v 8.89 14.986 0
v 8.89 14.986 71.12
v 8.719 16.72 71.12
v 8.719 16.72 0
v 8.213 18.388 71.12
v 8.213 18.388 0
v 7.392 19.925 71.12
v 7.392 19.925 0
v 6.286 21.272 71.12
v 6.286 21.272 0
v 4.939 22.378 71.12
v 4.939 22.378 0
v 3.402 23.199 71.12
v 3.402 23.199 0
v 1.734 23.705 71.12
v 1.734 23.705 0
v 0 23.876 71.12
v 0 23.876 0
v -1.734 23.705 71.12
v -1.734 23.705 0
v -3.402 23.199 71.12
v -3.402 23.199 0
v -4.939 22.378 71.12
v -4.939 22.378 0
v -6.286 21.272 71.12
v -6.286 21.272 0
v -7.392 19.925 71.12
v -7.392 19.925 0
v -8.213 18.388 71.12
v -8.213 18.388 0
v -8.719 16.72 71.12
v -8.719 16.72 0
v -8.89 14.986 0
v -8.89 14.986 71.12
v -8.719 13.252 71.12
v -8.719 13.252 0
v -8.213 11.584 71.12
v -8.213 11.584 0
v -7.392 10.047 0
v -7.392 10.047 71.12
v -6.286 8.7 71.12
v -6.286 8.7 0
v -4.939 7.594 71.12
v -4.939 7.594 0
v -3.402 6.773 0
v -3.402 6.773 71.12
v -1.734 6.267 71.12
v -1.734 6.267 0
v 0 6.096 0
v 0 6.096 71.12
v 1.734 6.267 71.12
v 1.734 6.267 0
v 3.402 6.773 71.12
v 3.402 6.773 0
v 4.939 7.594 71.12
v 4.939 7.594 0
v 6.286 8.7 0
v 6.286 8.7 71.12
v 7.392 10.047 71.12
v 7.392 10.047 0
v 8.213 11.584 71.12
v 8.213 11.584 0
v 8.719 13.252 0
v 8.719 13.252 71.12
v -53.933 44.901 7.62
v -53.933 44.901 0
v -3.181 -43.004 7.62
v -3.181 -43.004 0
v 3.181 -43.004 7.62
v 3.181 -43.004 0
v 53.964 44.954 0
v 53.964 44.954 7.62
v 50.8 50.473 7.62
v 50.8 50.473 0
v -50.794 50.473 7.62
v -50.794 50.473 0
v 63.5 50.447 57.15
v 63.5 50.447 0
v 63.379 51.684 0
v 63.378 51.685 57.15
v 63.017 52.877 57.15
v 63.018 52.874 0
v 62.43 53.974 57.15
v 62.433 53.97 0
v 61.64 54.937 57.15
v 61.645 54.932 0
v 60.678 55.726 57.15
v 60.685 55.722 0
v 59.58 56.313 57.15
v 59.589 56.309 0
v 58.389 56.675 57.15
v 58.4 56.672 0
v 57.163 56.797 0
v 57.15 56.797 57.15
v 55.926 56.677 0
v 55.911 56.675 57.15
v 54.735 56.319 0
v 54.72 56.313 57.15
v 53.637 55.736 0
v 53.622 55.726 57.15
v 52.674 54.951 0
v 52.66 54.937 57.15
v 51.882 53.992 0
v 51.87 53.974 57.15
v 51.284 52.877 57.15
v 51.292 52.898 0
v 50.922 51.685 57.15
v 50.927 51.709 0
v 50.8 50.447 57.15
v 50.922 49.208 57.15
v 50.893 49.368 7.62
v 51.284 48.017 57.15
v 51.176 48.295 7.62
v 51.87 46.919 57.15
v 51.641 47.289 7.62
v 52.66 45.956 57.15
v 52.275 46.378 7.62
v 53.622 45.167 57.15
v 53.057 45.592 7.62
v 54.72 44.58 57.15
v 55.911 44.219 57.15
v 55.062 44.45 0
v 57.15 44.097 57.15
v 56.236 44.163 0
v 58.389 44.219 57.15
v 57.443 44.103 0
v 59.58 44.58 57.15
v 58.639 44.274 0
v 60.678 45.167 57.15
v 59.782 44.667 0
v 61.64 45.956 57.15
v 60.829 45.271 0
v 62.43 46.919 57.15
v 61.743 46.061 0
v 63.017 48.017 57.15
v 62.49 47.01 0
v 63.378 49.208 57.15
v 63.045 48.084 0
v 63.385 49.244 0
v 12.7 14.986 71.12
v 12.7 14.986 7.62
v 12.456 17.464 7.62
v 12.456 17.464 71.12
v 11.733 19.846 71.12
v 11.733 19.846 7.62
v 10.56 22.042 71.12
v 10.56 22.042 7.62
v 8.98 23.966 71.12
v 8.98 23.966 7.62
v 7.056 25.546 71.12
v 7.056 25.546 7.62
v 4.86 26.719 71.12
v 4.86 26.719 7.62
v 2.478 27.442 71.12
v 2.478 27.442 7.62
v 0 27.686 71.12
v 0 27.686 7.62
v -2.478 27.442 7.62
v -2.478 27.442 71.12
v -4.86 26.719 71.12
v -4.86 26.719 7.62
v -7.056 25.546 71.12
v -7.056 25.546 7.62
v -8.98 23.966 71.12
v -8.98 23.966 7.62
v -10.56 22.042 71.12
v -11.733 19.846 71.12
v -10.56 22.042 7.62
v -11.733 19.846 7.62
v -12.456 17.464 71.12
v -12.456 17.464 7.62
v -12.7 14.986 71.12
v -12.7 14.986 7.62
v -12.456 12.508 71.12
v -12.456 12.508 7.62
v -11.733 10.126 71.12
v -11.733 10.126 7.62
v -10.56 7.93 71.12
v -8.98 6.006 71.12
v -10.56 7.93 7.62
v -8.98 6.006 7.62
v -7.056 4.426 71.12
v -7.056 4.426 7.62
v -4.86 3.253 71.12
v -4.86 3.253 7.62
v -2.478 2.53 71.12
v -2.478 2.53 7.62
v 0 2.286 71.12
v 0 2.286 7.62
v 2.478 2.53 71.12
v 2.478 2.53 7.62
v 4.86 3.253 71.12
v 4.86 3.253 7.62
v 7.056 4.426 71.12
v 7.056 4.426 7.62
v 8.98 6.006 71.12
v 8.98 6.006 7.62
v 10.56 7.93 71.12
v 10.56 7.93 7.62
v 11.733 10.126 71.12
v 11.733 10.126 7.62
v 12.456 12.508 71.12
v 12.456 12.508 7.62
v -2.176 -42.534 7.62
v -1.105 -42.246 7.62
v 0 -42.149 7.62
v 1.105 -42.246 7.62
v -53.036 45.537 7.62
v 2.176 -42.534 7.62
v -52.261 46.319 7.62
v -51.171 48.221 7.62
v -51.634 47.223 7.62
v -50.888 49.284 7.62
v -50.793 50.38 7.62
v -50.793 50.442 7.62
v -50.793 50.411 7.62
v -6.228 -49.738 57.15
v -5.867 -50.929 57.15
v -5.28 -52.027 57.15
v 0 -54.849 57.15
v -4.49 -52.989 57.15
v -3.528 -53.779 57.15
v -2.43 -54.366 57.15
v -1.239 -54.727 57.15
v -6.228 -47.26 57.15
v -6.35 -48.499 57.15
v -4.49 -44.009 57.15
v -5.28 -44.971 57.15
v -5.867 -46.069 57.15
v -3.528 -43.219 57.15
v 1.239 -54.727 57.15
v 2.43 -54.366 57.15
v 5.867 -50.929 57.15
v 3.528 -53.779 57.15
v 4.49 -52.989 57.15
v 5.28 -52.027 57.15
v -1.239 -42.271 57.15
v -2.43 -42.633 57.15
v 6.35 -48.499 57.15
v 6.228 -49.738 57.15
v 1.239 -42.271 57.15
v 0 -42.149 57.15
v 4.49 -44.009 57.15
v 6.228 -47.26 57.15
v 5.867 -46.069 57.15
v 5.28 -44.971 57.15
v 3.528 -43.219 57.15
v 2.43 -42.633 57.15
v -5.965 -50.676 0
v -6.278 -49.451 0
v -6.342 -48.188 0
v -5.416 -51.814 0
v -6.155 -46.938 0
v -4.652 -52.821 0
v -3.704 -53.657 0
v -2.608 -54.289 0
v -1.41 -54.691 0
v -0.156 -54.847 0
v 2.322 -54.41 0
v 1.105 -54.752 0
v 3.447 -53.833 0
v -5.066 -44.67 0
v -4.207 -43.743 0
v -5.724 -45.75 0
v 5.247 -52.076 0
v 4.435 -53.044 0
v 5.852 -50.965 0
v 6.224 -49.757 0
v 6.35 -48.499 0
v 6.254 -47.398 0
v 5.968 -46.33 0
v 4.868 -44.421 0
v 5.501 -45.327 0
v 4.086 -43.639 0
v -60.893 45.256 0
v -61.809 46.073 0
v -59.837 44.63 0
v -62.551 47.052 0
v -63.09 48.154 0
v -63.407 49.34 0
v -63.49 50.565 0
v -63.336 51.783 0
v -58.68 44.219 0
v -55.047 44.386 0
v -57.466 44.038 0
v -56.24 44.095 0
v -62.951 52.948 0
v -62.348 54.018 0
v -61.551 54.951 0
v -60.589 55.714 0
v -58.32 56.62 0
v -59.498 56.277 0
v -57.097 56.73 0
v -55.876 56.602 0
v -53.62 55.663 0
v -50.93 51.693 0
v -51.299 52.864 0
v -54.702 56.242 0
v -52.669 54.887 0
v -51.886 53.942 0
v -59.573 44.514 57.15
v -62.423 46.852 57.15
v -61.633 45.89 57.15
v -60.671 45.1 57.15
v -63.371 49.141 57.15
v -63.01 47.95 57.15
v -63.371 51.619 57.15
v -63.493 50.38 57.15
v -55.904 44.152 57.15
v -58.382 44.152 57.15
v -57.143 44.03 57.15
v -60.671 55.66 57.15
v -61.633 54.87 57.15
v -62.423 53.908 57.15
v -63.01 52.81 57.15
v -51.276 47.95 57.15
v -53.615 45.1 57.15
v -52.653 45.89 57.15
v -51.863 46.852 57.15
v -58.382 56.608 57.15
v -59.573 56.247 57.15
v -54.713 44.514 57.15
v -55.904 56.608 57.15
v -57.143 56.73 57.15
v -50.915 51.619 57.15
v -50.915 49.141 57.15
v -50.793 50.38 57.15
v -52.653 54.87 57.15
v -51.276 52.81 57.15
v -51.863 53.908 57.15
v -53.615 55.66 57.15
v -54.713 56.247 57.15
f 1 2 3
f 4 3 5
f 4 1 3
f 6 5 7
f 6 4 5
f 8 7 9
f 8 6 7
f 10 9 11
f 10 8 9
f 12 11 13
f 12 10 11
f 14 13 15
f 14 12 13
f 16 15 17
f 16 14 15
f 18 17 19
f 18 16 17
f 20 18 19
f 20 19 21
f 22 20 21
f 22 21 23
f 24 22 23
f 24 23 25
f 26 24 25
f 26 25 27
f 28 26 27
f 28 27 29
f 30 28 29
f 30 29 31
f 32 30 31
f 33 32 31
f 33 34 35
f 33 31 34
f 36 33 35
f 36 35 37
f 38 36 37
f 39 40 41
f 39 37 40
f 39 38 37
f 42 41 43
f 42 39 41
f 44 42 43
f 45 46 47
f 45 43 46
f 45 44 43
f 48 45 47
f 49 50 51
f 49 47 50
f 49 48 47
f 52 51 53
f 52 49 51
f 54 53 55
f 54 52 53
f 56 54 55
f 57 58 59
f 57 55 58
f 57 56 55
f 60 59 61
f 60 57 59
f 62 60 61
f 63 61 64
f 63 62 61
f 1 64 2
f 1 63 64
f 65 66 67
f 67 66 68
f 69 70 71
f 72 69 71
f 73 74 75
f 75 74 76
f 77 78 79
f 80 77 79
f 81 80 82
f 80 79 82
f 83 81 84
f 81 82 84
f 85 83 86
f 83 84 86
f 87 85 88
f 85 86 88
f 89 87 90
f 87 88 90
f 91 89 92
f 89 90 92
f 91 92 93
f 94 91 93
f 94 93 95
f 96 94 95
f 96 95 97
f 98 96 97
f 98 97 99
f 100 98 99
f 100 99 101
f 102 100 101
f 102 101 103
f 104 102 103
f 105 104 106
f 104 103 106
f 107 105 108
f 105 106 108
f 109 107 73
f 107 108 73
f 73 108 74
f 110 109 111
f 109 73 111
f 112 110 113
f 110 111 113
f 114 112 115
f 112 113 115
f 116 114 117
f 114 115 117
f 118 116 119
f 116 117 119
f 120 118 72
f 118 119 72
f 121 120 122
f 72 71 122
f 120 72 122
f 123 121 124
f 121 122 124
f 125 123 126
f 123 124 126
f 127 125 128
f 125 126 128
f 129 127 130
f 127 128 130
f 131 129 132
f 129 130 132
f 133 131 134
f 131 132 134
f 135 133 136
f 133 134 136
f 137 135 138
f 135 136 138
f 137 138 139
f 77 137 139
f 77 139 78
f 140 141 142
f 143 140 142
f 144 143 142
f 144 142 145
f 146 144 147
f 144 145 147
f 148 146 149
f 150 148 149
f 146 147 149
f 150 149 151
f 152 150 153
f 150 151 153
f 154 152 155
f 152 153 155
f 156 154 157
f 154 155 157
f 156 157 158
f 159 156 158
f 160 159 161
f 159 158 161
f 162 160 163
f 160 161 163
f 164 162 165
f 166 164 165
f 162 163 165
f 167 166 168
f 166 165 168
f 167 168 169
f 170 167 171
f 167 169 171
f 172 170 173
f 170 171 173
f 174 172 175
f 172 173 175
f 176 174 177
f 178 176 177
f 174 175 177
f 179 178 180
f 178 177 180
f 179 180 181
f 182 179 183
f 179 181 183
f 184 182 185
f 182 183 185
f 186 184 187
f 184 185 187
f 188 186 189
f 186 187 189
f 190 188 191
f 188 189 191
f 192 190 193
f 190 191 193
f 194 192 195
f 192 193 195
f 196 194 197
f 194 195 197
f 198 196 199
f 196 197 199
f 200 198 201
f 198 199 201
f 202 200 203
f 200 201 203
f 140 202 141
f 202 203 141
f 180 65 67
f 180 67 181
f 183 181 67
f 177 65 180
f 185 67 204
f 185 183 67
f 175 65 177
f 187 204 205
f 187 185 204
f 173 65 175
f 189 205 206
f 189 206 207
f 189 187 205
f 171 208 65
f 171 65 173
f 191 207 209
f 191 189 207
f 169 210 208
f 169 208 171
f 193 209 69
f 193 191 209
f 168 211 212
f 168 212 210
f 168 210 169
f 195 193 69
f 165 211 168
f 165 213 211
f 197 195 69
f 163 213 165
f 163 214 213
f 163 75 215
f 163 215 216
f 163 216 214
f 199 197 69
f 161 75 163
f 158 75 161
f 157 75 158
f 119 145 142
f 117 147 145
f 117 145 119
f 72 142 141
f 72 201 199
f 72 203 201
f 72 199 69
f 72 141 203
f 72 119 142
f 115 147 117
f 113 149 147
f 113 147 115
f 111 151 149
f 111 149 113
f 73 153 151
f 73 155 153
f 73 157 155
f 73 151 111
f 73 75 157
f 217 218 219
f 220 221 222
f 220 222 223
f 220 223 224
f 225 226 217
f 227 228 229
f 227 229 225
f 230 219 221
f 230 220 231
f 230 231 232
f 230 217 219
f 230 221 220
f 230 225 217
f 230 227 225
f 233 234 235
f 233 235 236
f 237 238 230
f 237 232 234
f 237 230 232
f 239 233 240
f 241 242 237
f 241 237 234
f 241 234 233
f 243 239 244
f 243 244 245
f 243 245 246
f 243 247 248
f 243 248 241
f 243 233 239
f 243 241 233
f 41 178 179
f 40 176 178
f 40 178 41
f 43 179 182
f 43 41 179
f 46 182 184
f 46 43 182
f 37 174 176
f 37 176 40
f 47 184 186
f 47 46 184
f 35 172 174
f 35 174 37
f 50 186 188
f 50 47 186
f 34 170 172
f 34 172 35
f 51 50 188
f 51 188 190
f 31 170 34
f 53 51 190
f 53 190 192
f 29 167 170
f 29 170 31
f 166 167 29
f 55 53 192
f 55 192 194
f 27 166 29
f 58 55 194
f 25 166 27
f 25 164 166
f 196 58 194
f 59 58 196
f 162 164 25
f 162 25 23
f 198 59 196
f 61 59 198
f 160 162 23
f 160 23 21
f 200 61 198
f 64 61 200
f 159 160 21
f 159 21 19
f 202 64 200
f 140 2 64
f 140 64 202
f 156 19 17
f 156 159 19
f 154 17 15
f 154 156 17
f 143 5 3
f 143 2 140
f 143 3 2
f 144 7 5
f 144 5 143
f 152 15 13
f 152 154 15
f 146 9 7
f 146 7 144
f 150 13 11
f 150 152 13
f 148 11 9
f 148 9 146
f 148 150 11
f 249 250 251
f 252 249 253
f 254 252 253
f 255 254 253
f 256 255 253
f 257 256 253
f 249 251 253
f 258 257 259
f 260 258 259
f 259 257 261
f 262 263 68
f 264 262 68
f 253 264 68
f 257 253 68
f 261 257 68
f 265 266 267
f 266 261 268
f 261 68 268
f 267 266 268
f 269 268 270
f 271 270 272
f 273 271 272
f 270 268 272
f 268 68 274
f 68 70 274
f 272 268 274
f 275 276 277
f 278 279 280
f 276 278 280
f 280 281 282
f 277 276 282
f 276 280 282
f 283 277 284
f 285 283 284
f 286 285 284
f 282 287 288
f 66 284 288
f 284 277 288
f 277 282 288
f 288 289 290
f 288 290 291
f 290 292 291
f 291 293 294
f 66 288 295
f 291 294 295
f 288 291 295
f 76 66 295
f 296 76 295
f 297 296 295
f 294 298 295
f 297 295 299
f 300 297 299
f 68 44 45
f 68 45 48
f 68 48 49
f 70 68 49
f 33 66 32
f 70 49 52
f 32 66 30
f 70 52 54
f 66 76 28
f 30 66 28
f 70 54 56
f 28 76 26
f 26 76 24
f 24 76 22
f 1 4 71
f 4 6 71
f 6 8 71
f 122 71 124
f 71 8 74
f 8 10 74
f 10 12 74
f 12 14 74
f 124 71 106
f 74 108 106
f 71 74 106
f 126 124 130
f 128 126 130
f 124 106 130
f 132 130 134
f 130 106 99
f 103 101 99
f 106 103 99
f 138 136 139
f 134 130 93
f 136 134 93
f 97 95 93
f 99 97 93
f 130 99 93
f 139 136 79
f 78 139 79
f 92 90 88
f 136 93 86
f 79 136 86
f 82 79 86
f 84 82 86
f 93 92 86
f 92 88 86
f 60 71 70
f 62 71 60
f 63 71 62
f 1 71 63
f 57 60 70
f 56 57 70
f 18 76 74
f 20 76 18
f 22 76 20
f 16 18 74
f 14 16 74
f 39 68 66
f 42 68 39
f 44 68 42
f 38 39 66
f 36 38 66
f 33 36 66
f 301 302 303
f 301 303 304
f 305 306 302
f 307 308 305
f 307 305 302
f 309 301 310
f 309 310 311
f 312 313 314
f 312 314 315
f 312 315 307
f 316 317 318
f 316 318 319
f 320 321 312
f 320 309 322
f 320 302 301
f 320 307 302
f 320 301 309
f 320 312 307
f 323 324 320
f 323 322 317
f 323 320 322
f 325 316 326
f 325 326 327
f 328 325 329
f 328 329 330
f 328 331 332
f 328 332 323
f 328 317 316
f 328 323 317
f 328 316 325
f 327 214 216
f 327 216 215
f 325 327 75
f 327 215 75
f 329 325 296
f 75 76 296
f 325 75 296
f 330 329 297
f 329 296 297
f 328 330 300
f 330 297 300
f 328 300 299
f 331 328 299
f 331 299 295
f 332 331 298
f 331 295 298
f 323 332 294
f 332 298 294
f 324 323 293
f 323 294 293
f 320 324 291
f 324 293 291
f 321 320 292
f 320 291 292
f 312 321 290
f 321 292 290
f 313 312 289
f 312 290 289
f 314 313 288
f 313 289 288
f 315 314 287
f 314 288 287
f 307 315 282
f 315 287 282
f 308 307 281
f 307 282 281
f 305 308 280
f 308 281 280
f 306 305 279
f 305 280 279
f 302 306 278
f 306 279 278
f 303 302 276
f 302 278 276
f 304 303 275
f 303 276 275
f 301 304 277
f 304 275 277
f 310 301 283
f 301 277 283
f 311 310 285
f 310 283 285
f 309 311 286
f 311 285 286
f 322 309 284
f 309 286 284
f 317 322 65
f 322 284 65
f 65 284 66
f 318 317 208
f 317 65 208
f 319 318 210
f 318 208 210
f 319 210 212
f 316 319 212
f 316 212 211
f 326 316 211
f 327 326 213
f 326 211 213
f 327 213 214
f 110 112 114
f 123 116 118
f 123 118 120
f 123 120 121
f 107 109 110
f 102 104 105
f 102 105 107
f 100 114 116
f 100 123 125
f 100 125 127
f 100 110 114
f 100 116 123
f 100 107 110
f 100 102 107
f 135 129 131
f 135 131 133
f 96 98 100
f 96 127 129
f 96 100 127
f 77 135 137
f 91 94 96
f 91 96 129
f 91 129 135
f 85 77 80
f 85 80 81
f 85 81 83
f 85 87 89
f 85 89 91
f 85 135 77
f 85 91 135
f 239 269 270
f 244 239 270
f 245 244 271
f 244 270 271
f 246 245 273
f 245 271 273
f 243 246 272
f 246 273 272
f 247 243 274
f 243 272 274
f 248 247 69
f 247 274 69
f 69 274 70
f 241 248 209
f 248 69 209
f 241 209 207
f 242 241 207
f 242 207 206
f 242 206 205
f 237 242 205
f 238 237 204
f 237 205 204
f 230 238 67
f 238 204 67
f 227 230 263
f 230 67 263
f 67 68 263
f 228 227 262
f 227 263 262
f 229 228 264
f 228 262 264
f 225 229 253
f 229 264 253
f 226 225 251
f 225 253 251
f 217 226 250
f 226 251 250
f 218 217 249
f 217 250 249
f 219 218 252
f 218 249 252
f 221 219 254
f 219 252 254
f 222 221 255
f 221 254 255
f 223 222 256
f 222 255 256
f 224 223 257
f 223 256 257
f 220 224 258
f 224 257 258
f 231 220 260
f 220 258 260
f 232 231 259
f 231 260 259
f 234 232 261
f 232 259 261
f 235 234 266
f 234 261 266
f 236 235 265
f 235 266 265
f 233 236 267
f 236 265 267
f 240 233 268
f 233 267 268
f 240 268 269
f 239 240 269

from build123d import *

# Parameters (mm, degrees)
F1_DEPTH = 7.62
F2_R     = 12.7
F3_DEPTH = 63.5
F4_R     = 8.89
F5_DEPTH = 71.121
F6_R     = 6.35
F7_DEPTH = 57.15


with BuildPart() as f1:
    # F0 (on Top) → F1 (new body)
    with BuildSketch(Plane.XY):
        Polygon((-57.15, 50.472703), (0, -48.514001), (57.15, 50.472703), align=None)
    extrude(amount=F1_DEPTH)

    # F2 (on face) → F3 (join)
    with BuildSketch(Plane.XY.offset(7.62)):
        with Locations((0, 14.985999)):
            Circle(F2_R)
    extrude(amount=F3_DEPTH)

    # F4 (on Top) → F5 (cut, through all)
    with BuildSketch(Plane.XY):
        with Locations((0, 14.985999)):
            Circle(F4_R)
    extrude(amount=F5_DEPTH, mode=Mode.SUBTRACT)

    # F6 (on Top) → F7 (join)
    with BuildSketch(Plane.XY):
        with Locations((0, -48.499294)):
            Circle(F6_R)
        with Locations((-57.143047, 50.380189)):
            Circle(F6_R)
        with Locations((57.150319, 50.4466)):
            Circle(F6_R)
    extrude(amount=F7_DEPTH)


solid = f1.part
